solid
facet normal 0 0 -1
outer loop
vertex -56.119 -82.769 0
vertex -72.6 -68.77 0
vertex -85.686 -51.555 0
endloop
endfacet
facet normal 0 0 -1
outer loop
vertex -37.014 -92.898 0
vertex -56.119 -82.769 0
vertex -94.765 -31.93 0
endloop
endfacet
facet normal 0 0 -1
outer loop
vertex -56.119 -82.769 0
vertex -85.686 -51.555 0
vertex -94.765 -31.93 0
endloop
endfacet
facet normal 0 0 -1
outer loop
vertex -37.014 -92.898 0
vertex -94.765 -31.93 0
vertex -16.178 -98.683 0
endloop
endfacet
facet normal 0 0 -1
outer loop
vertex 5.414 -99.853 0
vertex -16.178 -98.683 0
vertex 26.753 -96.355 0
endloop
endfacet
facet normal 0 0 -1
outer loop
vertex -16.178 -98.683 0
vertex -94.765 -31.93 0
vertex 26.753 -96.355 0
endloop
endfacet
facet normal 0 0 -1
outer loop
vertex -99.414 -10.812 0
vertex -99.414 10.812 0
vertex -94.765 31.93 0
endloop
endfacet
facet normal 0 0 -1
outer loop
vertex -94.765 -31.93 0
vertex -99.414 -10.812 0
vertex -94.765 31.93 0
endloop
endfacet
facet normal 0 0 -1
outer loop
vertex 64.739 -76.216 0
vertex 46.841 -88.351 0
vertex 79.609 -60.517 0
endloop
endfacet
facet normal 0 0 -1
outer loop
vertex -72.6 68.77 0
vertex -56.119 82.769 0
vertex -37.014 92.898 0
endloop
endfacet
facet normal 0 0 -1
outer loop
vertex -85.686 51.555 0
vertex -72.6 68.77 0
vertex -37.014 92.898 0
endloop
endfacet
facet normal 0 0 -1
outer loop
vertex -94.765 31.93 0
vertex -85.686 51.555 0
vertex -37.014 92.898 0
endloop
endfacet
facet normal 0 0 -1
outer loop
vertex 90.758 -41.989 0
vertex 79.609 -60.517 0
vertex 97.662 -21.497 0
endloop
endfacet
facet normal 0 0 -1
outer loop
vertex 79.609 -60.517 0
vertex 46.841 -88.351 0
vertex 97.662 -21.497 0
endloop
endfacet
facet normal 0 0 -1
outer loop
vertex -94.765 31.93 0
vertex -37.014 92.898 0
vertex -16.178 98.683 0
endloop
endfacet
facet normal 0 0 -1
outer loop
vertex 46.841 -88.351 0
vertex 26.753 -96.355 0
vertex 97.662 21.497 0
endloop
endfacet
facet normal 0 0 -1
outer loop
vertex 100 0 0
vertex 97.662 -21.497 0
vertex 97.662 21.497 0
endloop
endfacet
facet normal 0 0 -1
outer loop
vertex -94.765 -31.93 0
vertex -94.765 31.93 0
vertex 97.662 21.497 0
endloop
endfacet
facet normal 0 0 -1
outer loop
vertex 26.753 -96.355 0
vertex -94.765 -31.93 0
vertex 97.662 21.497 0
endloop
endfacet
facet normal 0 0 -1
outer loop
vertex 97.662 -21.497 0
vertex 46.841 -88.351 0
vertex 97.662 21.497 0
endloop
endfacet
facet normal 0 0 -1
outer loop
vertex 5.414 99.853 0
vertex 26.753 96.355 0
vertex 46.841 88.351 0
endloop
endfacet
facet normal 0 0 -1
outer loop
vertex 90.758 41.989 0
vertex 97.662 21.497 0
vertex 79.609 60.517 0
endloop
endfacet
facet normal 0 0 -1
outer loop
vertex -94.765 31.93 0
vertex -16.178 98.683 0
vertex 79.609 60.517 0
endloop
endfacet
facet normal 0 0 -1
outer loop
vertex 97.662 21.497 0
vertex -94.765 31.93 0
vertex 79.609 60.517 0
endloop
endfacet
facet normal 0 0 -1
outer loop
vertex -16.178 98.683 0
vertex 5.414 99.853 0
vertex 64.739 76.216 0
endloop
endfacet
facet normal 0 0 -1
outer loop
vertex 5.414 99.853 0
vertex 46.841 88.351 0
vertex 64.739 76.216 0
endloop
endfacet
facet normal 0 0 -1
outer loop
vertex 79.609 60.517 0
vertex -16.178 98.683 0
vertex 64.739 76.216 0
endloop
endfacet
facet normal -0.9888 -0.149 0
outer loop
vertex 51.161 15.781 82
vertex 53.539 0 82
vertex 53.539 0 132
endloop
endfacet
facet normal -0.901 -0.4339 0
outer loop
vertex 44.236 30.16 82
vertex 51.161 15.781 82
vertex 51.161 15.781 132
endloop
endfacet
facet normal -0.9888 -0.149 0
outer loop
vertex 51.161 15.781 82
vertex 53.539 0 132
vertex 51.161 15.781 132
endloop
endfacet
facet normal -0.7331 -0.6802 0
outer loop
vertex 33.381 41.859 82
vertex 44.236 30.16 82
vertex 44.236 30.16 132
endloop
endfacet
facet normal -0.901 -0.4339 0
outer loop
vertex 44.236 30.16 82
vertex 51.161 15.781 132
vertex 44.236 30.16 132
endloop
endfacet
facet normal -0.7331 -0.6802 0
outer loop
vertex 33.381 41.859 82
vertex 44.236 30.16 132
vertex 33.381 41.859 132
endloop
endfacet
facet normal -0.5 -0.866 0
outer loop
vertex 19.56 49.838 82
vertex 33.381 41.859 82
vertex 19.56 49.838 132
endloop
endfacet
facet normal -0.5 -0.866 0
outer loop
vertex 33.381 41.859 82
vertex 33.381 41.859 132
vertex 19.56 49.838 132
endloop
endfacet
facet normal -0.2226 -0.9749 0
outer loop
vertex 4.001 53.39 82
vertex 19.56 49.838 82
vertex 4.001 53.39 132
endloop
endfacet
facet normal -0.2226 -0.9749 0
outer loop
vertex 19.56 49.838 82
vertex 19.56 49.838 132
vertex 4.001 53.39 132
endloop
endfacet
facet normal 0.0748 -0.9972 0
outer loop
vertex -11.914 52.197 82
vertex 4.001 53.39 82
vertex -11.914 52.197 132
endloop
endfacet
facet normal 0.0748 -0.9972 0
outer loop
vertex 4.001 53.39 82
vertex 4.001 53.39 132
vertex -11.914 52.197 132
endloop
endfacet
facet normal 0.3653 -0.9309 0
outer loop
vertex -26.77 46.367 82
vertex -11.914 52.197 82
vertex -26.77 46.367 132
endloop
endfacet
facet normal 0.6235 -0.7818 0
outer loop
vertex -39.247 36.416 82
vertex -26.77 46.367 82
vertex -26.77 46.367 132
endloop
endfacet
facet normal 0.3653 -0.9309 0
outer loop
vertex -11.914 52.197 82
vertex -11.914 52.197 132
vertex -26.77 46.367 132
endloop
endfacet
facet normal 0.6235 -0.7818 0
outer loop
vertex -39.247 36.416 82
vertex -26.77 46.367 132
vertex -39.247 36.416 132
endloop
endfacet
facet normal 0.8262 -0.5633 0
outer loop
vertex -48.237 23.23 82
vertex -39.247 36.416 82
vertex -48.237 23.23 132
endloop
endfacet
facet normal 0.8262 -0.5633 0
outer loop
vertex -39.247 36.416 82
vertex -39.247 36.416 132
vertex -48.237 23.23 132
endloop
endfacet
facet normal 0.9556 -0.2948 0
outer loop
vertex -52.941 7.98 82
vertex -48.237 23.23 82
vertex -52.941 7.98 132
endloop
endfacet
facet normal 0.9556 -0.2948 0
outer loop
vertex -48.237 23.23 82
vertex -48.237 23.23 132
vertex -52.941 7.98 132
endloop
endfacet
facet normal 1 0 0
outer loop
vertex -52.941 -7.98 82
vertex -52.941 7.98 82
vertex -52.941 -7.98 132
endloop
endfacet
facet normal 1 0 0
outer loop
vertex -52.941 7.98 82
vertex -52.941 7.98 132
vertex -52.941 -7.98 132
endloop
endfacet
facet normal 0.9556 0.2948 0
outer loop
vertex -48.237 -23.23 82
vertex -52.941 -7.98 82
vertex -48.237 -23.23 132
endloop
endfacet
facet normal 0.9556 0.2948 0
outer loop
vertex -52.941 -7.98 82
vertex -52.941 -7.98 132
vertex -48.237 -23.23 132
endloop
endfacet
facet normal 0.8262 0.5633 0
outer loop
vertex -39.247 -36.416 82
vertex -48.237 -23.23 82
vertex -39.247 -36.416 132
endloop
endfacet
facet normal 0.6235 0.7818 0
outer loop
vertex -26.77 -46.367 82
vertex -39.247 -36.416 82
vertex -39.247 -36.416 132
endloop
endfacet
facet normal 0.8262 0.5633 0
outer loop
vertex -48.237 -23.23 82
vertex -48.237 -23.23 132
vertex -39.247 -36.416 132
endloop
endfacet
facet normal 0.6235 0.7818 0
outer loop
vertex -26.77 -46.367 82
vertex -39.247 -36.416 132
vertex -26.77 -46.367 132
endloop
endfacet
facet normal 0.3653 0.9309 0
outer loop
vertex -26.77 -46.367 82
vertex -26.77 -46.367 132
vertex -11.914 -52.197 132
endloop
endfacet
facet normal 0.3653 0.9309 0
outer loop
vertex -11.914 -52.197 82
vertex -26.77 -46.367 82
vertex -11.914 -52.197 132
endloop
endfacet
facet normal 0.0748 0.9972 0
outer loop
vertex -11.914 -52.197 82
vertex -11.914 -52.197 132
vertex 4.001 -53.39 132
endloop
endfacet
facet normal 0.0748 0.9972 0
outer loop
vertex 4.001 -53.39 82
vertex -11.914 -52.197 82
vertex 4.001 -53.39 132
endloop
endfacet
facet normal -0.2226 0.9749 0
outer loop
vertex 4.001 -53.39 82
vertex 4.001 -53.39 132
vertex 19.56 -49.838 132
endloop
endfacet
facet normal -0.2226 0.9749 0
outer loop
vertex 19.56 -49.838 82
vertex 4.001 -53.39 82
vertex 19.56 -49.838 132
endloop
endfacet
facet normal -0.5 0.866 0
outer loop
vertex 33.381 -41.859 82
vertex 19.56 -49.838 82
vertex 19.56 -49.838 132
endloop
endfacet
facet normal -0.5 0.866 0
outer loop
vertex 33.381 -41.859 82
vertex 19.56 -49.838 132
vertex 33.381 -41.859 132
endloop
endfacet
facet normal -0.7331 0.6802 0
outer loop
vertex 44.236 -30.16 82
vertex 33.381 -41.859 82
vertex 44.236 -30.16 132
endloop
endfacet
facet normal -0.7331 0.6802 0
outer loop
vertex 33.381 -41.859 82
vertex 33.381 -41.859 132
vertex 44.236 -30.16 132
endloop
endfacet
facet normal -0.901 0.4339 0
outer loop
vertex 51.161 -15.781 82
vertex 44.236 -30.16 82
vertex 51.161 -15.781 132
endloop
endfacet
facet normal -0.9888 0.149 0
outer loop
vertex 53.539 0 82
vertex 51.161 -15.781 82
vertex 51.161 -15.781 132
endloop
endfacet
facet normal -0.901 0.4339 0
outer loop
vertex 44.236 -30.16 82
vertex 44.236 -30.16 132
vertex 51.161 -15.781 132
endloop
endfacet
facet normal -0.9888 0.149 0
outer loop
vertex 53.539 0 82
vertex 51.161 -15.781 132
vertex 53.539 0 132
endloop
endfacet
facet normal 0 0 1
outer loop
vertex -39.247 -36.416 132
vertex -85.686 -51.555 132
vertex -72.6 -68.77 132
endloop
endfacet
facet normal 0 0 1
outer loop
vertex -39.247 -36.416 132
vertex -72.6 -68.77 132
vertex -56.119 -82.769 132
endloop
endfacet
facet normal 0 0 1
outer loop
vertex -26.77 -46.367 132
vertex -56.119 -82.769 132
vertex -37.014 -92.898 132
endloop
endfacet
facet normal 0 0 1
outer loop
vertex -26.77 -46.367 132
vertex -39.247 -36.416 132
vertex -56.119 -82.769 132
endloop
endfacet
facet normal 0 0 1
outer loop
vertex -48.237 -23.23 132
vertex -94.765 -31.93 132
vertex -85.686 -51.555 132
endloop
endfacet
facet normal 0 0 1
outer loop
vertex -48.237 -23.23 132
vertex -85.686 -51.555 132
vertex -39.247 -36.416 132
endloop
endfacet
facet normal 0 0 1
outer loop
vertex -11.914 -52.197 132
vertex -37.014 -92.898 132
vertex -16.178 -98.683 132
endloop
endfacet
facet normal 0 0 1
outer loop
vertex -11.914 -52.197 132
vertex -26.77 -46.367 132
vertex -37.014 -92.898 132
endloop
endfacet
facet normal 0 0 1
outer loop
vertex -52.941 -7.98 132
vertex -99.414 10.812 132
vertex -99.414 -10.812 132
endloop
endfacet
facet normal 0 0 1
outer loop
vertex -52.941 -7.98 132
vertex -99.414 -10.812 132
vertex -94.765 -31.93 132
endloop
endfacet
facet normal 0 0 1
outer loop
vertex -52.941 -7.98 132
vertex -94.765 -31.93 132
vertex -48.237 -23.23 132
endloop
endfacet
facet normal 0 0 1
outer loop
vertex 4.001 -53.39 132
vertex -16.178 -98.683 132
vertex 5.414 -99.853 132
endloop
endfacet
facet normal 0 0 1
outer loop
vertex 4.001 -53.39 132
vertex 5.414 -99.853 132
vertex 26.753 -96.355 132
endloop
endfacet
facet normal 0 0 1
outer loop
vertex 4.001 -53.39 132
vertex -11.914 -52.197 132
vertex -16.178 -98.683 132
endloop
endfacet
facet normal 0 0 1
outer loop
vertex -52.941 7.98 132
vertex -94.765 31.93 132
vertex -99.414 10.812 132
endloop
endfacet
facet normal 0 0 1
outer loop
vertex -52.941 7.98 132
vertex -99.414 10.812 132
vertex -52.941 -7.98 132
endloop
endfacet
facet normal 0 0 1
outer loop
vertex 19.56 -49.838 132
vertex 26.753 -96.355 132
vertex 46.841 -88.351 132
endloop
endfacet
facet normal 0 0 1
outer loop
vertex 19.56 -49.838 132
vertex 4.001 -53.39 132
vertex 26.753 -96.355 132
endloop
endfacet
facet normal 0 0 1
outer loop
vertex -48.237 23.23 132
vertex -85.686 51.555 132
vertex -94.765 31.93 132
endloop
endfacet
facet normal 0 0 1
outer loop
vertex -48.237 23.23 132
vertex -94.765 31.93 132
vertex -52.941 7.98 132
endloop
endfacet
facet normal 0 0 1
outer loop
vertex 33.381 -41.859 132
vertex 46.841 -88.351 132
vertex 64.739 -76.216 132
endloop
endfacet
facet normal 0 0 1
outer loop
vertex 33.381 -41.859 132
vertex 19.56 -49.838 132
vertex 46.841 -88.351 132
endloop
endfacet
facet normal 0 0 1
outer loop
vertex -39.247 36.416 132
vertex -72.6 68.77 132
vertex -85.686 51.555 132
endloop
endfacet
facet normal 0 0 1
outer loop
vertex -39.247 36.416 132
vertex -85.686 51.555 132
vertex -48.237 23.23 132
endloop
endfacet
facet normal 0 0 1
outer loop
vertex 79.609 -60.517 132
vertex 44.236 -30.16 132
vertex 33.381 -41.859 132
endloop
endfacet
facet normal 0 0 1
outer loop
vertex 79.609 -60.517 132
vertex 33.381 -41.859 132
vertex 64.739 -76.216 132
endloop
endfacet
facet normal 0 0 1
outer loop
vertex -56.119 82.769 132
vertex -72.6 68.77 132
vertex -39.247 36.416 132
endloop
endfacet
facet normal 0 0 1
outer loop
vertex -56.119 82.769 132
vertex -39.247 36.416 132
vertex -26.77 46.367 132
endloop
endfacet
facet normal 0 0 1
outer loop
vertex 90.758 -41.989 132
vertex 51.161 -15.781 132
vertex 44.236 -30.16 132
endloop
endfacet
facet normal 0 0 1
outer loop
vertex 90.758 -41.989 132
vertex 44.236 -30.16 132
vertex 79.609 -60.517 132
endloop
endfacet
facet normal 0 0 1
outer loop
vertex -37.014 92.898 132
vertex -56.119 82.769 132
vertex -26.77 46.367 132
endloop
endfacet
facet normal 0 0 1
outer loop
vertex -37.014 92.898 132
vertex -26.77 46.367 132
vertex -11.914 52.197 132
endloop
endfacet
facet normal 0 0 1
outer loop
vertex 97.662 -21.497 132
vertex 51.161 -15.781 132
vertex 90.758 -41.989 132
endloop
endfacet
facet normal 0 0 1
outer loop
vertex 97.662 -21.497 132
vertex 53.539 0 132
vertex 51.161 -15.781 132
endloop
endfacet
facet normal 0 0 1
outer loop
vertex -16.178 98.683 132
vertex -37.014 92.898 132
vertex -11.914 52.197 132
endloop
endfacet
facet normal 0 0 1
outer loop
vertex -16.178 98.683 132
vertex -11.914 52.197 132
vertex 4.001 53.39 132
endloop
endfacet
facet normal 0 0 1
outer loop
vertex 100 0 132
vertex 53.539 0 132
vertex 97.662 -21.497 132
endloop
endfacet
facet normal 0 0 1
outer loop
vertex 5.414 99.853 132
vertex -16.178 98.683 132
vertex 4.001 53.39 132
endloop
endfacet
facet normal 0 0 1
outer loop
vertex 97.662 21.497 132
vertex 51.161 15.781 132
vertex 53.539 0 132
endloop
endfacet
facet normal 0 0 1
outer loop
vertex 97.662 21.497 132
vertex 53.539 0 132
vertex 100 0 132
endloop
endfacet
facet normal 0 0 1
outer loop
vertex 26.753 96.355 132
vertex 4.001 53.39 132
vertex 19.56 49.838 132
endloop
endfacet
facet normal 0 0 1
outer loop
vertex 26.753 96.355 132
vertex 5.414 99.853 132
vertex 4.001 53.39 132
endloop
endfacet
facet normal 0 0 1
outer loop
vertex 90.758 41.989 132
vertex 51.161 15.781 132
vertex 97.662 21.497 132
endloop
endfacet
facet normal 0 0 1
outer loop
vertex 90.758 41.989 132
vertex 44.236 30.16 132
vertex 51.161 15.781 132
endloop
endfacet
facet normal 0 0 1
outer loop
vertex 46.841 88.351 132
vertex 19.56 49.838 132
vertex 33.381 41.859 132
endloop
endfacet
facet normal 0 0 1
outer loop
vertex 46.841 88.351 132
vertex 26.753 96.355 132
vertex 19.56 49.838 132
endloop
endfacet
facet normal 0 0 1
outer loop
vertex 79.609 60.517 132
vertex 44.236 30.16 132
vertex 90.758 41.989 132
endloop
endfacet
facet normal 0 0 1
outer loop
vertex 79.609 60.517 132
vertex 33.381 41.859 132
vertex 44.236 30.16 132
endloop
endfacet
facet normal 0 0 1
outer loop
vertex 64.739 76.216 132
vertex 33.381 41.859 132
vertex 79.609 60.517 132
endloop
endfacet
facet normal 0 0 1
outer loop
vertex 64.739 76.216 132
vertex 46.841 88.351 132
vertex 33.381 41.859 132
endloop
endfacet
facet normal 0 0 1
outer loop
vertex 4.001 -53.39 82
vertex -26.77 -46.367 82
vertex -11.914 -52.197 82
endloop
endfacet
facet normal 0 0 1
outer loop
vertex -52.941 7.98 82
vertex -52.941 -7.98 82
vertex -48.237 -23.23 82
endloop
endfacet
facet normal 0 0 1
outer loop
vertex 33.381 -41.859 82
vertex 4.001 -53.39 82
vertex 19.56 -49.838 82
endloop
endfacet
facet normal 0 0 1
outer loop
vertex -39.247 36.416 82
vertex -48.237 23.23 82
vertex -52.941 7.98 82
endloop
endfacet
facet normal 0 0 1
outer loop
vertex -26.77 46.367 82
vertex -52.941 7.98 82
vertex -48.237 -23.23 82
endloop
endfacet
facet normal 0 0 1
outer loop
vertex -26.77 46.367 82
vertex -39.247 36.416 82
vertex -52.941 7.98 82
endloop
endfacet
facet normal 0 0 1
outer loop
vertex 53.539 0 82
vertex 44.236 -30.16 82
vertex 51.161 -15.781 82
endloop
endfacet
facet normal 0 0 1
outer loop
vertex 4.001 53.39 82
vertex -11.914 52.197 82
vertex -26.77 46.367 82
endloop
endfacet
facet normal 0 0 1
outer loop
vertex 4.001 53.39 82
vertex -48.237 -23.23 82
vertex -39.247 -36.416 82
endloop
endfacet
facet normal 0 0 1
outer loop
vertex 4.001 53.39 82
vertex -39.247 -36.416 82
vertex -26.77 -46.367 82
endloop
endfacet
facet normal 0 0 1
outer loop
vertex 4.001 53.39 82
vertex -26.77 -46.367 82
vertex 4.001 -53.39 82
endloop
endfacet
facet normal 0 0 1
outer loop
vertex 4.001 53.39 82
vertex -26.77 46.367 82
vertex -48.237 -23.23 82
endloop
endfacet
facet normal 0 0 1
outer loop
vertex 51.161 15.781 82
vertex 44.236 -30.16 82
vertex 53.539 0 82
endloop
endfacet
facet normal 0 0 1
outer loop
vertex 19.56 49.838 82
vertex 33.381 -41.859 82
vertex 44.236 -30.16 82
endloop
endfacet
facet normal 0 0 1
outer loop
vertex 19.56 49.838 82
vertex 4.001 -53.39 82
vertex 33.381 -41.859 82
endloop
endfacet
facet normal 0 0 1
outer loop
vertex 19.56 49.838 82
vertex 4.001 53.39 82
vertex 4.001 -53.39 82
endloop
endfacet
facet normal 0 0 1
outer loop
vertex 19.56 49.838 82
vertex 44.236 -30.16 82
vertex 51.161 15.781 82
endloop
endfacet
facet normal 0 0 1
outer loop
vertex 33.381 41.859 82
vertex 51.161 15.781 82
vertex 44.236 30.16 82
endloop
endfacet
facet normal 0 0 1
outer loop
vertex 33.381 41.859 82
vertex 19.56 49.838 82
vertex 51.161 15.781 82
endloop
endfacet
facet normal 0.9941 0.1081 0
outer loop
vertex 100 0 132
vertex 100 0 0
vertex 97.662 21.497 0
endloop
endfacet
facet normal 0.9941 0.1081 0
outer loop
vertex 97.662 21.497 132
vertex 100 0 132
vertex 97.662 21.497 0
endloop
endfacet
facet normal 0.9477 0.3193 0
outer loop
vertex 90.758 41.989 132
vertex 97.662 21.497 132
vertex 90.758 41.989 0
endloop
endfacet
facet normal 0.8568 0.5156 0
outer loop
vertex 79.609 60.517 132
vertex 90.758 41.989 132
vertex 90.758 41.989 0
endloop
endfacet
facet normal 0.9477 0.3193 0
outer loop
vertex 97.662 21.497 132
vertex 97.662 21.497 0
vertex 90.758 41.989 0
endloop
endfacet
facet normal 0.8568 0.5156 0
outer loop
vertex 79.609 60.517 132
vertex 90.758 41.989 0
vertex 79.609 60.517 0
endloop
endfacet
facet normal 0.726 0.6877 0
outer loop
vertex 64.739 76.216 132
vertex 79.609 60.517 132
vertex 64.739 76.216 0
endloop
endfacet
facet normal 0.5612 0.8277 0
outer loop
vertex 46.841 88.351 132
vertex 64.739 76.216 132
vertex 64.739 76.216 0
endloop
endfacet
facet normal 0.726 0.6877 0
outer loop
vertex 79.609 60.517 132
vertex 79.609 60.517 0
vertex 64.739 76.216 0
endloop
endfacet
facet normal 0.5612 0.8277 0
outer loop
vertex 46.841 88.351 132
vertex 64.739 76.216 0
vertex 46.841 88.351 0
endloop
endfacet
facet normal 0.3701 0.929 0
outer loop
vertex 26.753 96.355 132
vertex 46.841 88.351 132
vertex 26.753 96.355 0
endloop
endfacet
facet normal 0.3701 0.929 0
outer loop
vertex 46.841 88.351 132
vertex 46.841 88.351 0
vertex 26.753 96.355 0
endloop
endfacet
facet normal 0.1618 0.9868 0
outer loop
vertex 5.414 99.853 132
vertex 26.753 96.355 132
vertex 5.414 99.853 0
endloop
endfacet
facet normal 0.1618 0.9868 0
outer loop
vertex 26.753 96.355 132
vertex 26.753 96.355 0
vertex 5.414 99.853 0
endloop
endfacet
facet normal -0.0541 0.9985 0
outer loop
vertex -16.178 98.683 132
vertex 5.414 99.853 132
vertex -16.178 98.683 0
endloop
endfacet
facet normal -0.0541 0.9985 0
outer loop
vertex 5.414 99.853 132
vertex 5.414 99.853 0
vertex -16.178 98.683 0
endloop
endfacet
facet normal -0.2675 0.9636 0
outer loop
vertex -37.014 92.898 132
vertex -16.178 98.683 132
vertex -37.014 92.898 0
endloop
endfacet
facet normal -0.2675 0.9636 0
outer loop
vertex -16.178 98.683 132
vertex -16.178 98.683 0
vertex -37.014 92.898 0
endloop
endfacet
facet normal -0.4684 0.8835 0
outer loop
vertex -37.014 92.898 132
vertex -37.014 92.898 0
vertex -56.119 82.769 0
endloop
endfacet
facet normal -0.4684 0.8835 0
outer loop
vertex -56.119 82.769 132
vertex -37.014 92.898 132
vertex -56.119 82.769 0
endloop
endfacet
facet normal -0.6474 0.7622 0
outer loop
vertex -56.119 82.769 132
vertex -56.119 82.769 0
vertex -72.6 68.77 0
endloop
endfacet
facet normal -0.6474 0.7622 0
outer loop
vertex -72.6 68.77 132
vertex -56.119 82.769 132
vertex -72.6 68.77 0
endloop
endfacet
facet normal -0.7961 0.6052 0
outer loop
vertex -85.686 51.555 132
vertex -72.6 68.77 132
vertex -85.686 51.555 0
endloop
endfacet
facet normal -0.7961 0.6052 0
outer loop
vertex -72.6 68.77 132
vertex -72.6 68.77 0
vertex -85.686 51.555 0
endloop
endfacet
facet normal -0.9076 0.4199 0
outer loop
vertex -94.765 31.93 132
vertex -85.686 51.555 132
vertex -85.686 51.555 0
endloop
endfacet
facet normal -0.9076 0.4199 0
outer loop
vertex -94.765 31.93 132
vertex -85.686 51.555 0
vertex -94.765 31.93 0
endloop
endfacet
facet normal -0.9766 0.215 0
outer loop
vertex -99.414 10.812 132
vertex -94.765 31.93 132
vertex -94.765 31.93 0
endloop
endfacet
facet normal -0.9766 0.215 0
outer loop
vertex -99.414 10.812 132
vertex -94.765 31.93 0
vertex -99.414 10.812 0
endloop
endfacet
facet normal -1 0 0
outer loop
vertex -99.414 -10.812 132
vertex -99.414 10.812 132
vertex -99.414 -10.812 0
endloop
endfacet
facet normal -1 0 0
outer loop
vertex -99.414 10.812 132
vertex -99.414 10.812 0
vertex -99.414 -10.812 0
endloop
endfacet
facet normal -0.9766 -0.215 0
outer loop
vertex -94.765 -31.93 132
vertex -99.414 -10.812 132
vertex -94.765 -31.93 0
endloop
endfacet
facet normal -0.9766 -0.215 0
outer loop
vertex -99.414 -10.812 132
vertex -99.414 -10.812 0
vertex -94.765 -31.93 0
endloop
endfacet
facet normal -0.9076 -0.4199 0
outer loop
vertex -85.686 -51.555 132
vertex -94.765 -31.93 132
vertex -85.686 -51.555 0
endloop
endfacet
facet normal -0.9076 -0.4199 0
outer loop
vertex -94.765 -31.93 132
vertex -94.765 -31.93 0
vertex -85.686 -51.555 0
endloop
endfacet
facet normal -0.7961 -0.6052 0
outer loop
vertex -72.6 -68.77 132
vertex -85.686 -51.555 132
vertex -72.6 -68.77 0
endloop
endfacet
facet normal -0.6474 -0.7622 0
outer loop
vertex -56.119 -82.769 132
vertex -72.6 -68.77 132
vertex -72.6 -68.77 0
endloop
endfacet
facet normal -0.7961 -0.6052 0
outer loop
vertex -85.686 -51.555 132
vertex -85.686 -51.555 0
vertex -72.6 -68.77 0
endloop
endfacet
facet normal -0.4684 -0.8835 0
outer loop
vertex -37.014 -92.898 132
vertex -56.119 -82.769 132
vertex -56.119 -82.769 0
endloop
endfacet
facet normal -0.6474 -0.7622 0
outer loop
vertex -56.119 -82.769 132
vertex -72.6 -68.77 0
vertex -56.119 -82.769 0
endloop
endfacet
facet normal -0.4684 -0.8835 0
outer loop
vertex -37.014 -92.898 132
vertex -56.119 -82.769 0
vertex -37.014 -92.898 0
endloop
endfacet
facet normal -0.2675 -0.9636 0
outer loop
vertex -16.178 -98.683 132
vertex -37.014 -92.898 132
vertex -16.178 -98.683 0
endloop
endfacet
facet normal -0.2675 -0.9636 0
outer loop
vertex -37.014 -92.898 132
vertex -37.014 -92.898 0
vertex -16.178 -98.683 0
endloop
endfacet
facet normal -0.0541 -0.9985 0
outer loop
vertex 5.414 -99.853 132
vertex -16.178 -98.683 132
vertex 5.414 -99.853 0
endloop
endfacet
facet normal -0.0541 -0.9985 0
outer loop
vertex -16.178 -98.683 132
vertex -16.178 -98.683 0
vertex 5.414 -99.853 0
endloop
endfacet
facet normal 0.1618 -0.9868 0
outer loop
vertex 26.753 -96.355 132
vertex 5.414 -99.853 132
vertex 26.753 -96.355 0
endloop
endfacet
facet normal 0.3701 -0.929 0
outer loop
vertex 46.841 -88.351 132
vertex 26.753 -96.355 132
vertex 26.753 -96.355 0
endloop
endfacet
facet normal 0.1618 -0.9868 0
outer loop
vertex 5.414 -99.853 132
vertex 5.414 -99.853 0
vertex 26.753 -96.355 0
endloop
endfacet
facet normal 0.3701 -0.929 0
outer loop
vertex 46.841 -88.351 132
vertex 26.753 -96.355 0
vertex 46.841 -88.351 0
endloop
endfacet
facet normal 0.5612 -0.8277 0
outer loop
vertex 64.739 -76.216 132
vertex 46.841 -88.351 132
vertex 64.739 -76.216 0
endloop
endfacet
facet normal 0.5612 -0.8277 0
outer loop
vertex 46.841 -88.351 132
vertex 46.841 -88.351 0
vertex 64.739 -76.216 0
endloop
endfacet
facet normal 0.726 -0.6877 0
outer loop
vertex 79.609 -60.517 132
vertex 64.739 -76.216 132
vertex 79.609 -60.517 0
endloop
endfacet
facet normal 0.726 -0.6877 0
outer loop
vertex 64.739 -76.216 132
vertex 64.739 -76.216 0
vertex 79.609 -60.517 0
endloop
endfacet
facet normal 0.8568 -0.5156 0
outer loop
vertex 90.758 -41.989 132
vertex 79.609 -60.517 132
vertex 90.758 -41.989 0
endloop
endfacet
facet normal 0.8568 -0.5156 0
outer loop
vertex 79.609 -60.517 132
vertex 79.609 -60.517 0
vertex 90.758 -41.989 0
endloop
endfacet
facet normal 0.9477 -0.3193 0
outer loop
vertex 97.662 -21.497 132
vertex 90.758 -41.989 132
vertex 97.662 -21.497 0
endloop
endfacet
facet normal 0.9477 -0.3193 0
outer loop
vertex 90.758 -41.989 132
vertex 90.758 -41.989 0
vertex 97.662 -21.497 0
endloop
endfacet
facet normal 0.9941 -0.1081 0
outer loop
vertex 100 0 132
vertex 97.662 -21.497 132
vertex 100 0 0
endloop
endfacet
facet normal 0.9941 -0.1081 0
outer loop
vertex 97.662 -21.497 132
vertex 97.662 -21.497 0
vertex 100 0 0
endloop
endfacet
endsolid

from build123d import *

# Parameters (mm, degrees)
F0_R     = 10
F1_DEPTH = 25
F3_R     = 100
F4_DEPTH = 132
F5_R     = 53.5394433614
F6_DEPTH = 50


with BuildPart() as f1:
    # F0 (on Top) → F1 (new body)
    with BuildSketch(Plane.XY):
        Circle(F0_R)
    extrude(amount=F1_DEPTH)


with BuildPart() as f4:
    # F3 (on Top) → F4 (new body)
    with BuildSketch(Plane.XY):
        Circle(F3_R)
    extrude(amount=F4_DEPTH)

    # F5 (on face) → F6 (cut)
    with BuildSketch(Plane.XY.offset(132)):
        Circle(F5_R)
    extrude(amount=-F6_DEPTH, mode=Mode.SUBTRACT)


solid = f4.part
